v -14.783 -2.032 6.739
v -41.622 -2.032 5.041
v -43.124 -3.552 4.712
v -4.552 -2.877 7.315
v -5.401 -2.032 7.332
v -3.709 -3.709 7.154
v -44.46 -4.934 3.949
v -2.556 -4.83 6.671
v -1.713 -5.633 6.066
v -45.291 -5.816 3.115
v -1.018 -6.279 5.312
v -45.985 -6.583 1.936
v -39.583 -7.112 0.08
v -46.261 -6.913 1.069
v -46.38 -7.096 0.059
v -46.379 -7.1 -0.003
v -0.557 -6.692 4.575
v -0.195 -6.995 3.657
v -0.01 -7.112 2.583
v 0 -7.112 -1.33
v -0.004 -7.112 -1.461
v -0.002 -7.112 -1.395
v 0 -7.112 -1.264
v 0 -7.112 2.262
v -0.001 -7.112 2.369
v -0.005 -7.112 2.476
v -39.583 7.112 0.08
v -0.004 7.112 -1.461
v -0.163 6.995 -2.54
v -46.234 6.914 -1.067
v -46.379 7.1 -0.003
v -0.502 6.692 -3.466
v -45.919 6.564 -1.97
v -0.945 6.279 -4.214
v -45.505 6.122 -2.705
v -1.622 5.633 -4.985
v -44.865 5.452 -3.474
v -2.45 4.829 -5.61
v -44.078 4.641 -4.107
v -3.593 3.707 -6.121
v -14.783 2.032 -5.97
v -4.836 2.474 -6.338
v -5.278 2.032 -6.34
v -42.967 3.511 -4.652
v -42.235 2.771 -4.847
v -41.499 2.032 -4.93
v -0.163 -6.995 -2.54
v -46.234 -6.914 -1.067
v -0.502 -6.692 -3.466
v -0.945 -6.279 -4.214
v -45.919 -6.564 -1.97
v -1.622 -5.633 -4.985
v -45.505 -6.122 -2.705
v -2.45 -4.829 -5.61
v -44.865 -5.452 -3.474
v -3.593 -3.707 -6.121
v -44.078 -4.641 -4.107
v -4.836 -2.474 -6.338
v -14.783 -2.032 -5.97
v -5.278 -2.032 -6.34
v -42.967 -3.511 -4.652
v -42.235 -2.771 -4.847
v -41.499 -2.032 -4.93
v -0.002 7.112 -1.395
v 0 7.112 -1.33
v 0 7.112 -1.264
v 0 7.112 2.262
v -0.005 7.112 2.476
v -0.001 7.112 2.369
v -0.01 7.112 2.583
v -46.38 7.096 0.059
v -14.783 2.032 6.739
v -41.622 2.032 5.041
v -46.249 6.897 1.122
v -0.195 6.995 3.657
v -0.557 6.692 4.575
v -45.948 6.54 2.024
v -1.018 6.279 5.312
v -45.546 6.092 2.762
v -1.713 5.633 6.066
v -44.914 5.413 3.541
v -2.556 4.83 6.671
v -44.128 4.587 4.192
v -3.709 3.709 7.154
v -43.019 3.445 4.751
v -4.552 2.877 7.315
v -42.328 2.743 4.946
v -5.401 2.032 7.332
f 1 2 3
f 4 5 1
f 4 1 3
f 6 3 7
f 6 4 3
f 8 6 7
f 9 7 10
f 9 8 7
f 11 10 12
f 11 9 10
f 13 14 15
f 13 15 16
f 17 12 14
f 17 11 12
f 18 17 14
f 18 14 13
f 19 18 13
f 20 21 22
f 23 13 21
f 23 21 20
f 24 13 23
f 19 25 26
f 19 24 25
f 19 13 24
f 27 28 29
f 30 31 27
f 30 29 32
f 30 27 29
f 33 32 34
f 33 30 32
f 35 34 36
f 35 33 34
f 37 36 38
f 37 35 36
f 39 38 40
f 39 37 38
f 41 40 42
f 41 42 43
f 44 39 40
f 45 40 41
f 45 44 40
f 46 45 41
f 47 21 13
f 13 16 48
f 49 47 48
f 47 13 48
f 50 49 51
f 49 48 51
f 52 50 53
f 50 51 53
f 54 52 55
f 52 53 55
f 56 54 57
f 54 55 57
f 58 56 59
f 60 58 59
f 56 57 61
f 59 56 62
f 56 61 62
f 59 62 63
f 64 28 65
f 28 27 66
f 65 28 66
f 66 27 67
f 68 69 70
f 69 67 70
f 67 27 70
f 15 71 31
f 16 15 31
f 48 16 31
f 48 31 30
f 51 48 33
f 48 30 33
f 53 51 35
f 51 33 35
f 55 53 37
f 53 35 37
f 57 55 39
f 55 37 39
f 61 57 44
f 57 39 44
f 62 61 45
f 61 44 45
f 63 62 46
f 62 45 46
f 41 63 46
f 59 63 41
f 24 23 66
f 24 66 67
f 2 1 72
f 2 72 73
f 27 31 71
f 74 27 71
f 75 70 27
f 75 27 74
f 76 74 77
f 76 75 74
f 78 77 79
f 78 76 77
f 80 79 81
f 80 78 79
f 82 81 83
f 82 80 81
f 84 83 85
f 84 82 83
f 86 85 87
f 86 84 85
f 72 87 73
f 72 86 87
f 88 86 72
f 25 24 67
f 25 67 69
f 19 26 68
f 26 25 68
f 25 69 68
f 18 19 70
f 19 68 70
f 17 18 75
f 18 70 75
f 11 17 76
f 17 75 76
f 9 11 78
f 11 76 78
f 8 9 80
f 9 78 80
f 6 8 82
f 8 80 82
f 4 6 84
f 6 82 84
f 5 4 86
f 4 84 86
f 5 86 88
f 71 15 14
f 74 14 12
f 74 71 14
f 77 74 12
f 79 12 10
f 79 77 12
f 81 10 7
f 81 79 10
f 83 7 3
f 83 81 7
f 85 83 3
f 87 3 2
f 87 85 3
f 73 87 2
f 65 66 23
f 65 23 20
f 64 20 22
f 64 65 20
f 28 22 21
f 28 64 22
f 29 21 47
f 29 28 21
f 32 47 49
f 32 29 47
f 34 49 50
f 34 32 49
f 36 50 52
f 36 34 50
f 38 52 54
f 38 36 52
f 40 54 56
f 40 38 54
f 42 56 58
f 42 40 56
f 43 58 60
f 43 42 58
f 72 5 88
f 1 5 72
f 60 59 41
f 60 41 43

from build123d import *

# Parameters (mm, degrees)
F1_DEPTH      = 7.112
F1_DEPTH_BACK = 7.112
F2_T1_DEPTH   = 38.654431888
F2_T3_DEPTH   = 71.8161099821
F2_T5_DEPTH   = 40.6320472649
F2_T7_DEPTH   = 71.8736907455
F2_T9_DEPTH   = 38.0679604185
F2_T11_DEPTH  = 41.2815855973


# Not quite as in the source:
# - a fillet or chamfer that OpenCascade refuses, or shapes differently, is made with other operations: its cross-section is extruded or revolved along the edge and cut away or added


with BuildPart() as f1:
    # F0 (on Front) → F1 (new body, two sides)
    with BuildSketch(Plane.XZ) as f1_sk:
        Polygon((0, 7.673737593), (-14.7832315415, 6.7385453665), (-14.7832315415, -5.9697437044), (0, -6.5452465788), align=None)
        Polygon((-14.7832315415, 6.7385453665), (-46.3809780777, 4.7396612354), (-46.3809780777, -4.7396612354), (-14.7832315415, -5.9697437044), align=None)
    extrude(amount=F1_DEPTH)
    extrude(f1_sk.sketch, amount=-F1_DEPTH_BACK)

    # F2: fillet of radius 5.08 on 8 edges, made by hand

    # F2_s2 → F2_t1 (cut)
    with BuildSketch(Plane.XZ.offset(-19.327215944)):
        with BuildLine():
            ThreePointArc((-46.3809780777, 0.1464251422), (-44.9622803199, -3.37511797), (-41.4985899316, -4.9297298549))
            Line((-41.4985899316, -4.9297298549), (-46.3809780777, -4.7396612354))
            Line((-46.3809780777, -4.7396612354), (-46.3809780777, 0.1464251422))
        make_face()
    extrude(amount=F2_T1_DEPTH, mode=Mode.SUBTRACT)

    # F2_s4 → F2_t3 (cut)
    with BuildSketch(Plane(origin=(-58.8169483786, 0, 2.2897106602), x_dir=(0, 1, 0), z_dir=(0.9992431097, 0, -0.0388999712))):
        with BuildLine():
            ThreePointArc((-7.112, -1.460292545), (-5.6241024484, -5.0523949934), (-2.032, -6.540292545))
            Line((-2.032, -6.540292545), (-7.112, -6.540292545))
            Line((-7.112, -6.540292545), (-7.112, -1.460292545))
        make_face()
        with BuildLine():
            ThreePointArc((7.112, -1.460292545), (5.6241024484, -5.0523949934), (2.032, -6.540292545))
            Line((2.032, -6.540292545), (7.112, -6.540292545))
            Line((7.112, -6.540292545), (7.112, -1.460292545))
        make_face()
    extrude(amount=F2_T3_DEPTH, mode=Mode.SUBTRACT)

    # F2_s6 → F2_t5 (cut)
    with BuildSketch(Plane.XZ.offset(-20.3160236325)):
        with BuildLine():
            ThreePointArc((0, -1.2636371258), (-1.5584568878, -4.924939368), (-5.2776118539, -6.3397921229))
            Line((-5.2776118539, -6.3397921229), (0, -6.5452465788))
            Line((0, -6.5452465788), (0, -1.2636371258))
        make_face()
    extrude(amount=F2_T5_DEPTH, mode=Mode.SUBTRACT)

    # F2_s8 → F2_t7 (cut)
    with BuildSketch(Plane(origin=(13.1581724385, 0, 0.8323904381), x_dir=(0, 1, 0), z_dir=(-0.9980050505, 0, -0.063134137))):
        with BuildLine():
            ThreePointArc((-2.032, -7.6584288737), (-5.6241024484, -6.1705313222), (-7.112, -2.5784288737))
            Line((-7.112, -2.5784288737), (-7.112, -7.6584288737))
            Line((-7.112, -7.6584288737), (-2.032, -7.6584288737))
        make_face()
        with BuildLine():
            ThreePointArc((7.112, -2.5784288737), (5.6241024484, -6.1705313222), (2.032, -7.6584288737))
            Line((2.032, -7.6584288737), (7.112, -7.6584288737))
            Line((7.112, -7.6584288737), (7.112, -2.5784288737))
        make_face()
    extrude(amount=F2_T7_DEPTH, mode=Mode.SUBTRACT)

    # F2_s10 → F2_t9 (cut)
    with BuildSketch(Plane.XZ.offset(-19.0339802092)):
        with BuildLine():
            ThreePointArc((-46.3809780777, -0.0291308483), (-45.0047373026, 3.4477308981), (-41.6216994935, 5.040734808))
            Line((-41.6216994935, 5.040734808), (-46.3809780777, 4.7396612354))
            Line((-46.3809780777, 4.7396612354), (-46.3809780777, -0.0291308483))
        make_face()
    extrude(amount=F2_T9_DEPTH, mode=Mode.SUBTRACT)

    # F2_s12 → F2_t11 (cut)
    with BuildSketch(Plane.XZ.offset(-20.6407927986)):
        with BuildLine():
            ThreePointArc((0, 2.2622204735), (-1.6031382536, 5.9659796985), (-5.4007214159, 7.3320861299))
            Line((-5.4007214159, 7.3320861299), (0, 7.673737593))
            Line((0, 7.673737593), (0, 2.2622204735))
        make_face()
    extrude(amount=F2_T11_DEPTH, mode=Mode.SUBTRACT)


solid = f1.part
